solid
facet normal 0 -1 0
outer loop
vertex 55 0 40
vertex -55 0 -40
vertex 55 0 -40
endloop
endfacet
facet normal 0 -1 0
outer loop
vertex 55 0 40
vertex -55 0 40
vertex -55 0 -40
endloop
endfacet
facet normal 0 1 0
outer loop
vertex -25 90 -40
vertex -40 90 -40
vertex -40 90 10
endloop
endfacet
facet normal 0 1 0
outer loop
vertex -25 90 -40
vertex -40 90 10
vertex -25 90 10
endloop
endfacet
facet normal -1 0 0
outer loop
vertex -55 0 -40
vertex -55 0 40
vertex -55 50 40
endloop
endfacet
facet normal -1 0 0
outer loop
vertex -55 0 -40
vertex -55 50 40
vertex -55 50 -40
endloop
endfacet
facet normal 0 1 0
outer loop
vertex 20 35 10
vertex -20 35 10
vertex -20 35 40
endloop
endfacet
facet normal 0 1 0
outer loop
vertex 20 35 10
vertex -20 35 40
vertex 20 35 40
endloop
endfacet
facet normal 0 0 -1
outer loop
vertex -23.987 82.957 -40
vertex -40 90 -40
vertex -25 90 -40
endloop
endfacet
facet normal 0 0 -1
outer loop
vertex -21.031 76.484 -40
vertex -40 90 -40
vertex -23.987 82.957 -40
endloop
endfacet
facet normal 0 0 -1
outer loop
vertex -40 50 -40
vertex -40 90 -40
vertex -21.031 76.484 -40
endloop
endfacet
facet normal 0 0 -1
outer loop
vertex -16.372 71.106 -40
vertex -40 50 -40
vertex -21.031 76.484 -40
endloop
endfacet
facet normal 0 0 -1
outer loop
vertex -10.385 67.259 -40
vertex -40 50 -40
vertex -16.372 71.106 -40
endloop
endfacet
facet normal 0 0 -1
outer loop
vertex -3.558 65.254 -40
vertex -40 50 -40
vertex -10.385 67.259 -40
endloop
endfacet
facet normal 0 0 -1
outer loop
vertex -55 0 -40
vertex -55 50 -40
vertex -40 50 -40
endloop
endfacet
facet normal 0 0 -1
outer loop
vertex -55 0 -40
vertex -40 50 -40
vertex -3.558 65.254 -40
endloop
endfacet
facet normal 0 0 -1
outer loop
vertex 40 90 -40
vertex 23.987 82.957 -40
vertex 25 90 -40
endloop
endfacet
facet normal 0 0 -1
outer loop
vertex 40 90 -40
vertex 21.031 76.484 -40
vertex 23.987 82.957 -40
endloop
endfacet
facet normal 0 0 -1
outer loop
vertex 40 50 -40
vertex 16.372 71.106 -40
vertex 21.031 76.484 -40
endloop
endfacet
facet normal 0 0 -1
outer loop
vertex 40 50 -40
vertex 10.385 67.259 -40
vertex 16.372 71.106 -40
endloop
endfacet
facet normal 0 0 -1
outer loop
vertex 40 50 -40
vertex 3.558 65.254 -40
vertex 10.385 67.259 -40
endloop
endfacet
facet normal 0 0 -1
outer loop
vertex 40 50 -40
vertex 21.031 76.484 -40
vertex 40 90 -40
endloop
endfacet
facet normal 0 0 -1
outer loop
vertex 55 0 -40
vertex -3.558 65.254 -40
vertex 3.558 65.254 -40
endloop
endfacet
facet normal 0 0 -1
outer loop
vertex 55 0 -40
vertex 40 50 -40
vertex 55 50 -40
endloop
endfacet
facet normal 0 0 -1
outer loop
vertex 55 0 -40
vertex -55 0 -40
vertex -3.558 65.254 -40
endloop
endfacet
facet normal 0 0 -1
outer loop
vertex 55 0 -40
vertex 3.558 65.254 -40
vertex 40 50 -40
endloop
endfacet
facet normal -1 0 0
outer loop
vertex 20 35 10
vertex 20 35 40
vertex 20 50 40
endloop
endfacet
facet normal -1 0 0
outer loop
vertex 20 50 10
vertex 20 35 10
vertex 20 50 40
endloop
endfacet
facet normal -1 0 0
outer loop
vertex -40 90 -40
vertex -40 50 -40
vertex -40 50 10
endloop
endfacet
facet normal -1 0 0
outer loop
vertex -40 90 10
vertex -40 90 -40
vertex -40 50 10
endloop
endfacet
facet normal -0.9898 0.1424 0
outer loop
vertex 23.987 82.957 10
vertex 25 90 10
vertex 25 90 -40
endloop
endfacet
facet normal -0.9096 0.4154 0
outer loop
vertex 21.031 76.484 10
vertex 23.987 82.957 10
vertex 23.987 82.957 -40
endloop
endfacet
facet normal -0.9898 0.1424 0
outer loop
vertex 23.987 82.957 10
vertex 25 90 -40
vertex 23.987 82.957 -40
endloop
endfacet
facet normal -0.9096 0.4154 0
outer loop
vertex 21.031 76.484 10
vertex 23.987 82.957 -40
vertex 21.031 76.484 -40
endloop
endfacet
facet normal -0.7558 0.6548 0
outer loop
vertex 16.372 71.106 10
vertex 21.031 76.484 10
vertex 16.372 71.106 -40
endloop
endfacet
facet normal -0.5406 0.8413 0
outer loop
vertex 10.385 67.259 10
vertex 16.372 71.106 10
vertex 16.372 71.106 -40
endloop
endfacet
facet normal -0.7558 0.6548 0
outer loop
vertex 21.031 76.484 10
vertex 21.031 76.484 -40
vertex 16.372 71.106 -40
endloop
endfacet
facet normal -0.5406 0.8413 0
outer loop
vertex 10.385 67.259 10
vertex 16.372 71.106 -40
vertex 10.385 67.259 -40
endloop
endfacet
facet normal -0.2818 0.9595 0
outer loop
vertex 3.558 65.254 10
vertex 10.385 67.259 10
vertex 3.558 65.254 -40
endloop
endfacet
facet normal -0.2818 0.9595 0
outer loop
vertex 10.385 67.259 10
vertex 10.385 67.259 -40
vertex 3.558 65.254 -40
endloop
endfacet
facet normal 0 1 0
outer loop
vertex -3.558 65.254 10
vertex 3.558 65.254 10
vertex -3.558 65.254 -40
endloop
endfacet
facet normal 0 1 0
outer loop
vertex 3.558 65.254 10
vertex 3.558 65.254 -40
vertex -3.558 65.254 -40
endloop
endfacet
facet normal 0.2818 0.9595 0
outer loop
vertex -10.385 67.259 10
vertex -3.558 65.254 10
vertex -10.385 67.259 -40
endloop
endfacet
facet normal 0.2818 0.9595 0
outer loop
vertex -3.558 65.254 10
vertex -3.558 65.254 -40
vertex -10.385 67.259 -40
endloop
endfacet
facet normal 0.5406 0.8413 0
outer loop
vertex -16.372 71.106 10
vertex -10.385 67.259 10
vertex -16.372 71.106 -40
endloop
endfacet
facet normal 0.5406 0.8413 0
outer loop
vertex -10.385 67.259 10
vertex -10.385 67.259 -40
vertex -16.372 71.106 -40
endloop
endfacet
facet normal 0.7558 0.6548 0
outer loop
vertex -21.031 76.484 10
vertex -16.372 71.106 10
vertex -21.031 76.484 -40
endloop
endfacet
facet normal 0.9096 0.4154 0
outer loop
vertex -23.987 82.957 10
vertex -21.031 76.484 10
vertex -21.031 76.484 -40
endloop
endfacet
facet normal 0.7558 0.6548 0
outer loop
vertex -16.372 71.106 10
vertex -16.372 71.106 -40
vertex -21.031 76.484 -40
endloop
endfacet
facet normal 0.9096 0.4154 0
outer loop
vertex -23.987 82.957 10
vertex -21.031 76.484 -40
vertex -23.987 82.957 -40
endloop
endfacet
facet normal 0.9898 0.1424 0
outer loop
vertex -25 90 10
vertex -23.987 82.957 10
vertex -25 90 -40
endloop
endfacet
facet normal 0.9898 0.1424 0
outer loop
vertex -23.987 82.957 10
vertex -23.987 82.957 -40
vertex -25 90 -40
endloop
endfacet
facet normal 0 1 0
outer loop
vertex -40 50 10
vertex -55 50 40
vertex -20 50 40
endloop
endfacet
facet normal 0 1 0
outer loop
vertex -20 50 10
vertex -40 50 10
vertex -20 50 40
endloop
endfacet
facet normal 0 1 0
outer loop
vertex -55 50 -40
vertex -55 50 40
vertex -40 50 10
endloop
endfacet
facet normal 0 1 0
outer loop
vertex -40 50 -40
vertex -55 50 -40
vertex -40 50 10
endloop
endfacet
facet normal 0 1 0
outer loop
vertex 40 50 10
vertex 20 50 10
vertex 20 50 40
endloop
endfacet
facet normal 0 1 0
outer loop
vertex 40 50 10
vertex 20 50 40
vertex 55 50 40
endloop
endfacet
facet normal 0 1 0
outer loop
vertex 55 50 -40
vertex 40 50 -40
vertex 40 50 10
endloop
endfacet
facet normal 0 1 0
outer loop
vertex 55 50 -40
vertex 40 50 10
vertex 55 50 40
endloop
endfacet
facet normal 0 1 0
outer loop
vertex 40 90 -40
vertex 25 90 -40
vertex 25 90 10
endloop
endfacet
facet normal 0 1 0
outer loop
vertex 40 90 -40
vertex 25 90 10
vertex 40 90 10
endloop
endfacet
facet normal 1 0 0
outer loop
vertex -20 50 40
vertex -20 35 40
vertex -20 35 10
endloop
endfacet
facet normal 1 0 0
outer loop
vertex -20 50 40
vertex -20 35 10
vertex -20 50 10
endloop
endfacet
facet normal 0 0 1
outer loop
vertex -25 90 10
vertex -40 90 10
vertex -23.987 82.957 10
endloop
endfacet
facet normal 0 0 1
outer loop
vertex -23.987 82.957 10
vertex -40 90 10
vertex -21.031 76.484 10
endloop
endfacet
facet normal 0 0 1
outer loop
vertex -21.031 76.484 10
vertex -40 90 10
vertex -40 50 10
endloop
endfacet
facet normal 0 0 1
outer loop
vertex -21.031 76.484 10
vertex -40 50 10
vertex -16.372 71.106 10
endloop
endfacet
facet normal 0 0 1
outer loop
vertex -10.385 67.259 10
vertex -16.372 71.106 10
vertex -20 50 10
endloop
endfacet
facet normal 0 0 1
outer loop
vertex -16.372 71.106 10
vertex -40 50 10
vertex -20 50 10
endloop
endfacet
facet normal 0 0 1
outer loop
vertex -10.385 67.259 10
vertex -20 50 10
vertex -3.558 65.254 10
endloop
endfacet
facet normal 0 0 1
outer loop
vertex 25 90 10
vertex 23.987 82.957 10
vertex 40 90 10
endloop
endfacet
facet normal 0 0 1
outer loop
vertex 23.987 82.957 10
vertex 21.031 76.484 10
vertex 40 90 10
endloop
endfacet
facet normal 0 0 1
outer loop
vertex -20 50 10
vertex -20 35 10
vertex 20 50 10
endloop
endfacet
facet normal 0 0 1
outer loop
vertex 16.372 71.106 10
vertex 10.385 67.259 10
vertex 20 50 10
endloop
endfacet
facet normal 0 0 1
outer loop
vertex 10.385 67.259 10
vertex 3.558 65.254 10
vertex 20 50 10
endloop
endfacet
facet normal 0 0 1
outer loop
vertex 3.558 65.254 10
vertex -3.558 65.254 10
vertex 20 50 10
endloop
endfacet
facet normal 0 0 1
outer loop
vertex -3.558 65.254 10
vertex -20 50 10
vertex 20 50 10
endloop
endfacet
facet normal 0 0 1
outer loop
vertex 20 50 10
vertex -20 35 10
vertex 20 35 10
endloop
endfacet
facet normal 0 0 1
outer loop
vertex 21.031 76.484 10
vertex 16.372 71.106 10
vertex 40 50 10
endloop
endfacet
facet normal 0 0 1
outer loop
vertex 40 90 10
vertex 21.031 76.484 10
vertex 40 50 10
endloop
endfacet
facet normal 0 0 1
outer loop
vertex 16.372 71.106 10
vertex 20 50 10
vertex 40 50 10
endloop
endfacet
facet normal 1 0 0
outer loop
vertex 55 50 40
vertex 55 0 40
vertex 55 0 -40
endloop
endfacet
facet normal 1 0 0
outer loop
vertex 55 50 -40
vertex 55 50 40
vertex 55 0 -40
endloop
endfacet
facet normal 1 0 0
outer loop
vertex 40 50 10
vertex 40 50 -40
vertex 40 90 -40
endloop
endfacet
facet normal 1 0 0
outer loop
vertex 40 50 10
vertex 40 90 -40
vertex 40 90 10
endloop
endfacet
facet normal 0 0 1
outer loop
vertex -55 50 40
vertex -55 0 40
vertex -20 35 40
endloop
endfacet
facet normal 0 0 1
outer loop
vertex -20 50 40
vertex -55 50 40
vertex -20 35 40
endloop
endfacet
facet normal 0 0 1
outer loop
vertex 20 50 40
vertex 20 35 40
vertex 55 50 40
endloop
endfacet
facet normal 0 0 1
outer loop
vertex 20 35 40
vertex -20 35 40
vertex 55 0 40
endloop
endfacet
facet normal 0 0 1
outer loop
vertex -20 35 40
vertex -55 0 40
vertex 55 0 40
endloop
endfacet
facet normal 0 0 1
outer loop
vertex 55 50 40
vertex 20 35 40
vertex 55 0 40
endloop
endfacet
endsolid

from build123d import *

# Parameters (mm, degrees)
SKETCH3_W               = 110
SKETCH3_H               = 80
BOSS_EXTRUDE2_DEPTH     = 50
SKETCH6_W               = 80
SKETCH6_H               = 50
BOSS_EXTRUDE3_DEPTH     = 90
SKETCH7_R               = 25
CUT_EXTRUDE1_DEPTH      = 133.382022949
CUT_EXTRUDE2_DEPTH      = 133.382022949
CUT_EXTRUDE2_DEPTH_BACK = 30
SKETCH8_W               = 40
SKETCH8_H               = 15


with BuildPart() as part:
    # Sketch3 → Boss-Extrude2 (new body)
    with BuildSketch(Plane(origin=(0, 0, 0), x_dir=(1, 0, 0), z_dir=(0, 1, 0))):
        Rectangle(SKETCH3_W, SKETCH3_H)
    extrude(amount=BOSS_EXTRUDE2_DEPTH)

    # Sketch6 → Boss-Extrude3 (add)
    with BuildSketch(Plane.XZ):
        with Locations((0, -15)):
            Rectangle(SKETCH6_W, SKETCH6_H)
    extrude(amount=-BOSS_EXTRUDE3_DEPTH)

    # Sketch7 → Cut-Extrude1 (cut, through all)
    with BuildSketch(Plane(origin=(0, 0, -40), x_dir=(-1, 0, 0), z_dir=(0, 0, -1))):
        with Locations((0, 90)):
            Circle(SKETCH7_R)
    extrude(amount=-CUT_EXTRUDE1_DEPTH, mode=Mode.SUBTRACT)

    # Sketch8 → Cut-Extrude2 (cut, two sides: drawn at the far end of the back side and taken through both)
    with BuildSketch(Plane.XY.offset(40).offset(-CUT_EXTRUDE2_DEPTH_BACK)):
        with Locations((0, 42.5)):
            Rectangle(SKETCH8_W, SKETCH8_H)
    extrude(amount=CUT_EXTRUDE2_DEPTH + CUT_EXTRUDE2_DEPTH_BACK, mode=Mode.SUBTRACT)


solid = part.part
